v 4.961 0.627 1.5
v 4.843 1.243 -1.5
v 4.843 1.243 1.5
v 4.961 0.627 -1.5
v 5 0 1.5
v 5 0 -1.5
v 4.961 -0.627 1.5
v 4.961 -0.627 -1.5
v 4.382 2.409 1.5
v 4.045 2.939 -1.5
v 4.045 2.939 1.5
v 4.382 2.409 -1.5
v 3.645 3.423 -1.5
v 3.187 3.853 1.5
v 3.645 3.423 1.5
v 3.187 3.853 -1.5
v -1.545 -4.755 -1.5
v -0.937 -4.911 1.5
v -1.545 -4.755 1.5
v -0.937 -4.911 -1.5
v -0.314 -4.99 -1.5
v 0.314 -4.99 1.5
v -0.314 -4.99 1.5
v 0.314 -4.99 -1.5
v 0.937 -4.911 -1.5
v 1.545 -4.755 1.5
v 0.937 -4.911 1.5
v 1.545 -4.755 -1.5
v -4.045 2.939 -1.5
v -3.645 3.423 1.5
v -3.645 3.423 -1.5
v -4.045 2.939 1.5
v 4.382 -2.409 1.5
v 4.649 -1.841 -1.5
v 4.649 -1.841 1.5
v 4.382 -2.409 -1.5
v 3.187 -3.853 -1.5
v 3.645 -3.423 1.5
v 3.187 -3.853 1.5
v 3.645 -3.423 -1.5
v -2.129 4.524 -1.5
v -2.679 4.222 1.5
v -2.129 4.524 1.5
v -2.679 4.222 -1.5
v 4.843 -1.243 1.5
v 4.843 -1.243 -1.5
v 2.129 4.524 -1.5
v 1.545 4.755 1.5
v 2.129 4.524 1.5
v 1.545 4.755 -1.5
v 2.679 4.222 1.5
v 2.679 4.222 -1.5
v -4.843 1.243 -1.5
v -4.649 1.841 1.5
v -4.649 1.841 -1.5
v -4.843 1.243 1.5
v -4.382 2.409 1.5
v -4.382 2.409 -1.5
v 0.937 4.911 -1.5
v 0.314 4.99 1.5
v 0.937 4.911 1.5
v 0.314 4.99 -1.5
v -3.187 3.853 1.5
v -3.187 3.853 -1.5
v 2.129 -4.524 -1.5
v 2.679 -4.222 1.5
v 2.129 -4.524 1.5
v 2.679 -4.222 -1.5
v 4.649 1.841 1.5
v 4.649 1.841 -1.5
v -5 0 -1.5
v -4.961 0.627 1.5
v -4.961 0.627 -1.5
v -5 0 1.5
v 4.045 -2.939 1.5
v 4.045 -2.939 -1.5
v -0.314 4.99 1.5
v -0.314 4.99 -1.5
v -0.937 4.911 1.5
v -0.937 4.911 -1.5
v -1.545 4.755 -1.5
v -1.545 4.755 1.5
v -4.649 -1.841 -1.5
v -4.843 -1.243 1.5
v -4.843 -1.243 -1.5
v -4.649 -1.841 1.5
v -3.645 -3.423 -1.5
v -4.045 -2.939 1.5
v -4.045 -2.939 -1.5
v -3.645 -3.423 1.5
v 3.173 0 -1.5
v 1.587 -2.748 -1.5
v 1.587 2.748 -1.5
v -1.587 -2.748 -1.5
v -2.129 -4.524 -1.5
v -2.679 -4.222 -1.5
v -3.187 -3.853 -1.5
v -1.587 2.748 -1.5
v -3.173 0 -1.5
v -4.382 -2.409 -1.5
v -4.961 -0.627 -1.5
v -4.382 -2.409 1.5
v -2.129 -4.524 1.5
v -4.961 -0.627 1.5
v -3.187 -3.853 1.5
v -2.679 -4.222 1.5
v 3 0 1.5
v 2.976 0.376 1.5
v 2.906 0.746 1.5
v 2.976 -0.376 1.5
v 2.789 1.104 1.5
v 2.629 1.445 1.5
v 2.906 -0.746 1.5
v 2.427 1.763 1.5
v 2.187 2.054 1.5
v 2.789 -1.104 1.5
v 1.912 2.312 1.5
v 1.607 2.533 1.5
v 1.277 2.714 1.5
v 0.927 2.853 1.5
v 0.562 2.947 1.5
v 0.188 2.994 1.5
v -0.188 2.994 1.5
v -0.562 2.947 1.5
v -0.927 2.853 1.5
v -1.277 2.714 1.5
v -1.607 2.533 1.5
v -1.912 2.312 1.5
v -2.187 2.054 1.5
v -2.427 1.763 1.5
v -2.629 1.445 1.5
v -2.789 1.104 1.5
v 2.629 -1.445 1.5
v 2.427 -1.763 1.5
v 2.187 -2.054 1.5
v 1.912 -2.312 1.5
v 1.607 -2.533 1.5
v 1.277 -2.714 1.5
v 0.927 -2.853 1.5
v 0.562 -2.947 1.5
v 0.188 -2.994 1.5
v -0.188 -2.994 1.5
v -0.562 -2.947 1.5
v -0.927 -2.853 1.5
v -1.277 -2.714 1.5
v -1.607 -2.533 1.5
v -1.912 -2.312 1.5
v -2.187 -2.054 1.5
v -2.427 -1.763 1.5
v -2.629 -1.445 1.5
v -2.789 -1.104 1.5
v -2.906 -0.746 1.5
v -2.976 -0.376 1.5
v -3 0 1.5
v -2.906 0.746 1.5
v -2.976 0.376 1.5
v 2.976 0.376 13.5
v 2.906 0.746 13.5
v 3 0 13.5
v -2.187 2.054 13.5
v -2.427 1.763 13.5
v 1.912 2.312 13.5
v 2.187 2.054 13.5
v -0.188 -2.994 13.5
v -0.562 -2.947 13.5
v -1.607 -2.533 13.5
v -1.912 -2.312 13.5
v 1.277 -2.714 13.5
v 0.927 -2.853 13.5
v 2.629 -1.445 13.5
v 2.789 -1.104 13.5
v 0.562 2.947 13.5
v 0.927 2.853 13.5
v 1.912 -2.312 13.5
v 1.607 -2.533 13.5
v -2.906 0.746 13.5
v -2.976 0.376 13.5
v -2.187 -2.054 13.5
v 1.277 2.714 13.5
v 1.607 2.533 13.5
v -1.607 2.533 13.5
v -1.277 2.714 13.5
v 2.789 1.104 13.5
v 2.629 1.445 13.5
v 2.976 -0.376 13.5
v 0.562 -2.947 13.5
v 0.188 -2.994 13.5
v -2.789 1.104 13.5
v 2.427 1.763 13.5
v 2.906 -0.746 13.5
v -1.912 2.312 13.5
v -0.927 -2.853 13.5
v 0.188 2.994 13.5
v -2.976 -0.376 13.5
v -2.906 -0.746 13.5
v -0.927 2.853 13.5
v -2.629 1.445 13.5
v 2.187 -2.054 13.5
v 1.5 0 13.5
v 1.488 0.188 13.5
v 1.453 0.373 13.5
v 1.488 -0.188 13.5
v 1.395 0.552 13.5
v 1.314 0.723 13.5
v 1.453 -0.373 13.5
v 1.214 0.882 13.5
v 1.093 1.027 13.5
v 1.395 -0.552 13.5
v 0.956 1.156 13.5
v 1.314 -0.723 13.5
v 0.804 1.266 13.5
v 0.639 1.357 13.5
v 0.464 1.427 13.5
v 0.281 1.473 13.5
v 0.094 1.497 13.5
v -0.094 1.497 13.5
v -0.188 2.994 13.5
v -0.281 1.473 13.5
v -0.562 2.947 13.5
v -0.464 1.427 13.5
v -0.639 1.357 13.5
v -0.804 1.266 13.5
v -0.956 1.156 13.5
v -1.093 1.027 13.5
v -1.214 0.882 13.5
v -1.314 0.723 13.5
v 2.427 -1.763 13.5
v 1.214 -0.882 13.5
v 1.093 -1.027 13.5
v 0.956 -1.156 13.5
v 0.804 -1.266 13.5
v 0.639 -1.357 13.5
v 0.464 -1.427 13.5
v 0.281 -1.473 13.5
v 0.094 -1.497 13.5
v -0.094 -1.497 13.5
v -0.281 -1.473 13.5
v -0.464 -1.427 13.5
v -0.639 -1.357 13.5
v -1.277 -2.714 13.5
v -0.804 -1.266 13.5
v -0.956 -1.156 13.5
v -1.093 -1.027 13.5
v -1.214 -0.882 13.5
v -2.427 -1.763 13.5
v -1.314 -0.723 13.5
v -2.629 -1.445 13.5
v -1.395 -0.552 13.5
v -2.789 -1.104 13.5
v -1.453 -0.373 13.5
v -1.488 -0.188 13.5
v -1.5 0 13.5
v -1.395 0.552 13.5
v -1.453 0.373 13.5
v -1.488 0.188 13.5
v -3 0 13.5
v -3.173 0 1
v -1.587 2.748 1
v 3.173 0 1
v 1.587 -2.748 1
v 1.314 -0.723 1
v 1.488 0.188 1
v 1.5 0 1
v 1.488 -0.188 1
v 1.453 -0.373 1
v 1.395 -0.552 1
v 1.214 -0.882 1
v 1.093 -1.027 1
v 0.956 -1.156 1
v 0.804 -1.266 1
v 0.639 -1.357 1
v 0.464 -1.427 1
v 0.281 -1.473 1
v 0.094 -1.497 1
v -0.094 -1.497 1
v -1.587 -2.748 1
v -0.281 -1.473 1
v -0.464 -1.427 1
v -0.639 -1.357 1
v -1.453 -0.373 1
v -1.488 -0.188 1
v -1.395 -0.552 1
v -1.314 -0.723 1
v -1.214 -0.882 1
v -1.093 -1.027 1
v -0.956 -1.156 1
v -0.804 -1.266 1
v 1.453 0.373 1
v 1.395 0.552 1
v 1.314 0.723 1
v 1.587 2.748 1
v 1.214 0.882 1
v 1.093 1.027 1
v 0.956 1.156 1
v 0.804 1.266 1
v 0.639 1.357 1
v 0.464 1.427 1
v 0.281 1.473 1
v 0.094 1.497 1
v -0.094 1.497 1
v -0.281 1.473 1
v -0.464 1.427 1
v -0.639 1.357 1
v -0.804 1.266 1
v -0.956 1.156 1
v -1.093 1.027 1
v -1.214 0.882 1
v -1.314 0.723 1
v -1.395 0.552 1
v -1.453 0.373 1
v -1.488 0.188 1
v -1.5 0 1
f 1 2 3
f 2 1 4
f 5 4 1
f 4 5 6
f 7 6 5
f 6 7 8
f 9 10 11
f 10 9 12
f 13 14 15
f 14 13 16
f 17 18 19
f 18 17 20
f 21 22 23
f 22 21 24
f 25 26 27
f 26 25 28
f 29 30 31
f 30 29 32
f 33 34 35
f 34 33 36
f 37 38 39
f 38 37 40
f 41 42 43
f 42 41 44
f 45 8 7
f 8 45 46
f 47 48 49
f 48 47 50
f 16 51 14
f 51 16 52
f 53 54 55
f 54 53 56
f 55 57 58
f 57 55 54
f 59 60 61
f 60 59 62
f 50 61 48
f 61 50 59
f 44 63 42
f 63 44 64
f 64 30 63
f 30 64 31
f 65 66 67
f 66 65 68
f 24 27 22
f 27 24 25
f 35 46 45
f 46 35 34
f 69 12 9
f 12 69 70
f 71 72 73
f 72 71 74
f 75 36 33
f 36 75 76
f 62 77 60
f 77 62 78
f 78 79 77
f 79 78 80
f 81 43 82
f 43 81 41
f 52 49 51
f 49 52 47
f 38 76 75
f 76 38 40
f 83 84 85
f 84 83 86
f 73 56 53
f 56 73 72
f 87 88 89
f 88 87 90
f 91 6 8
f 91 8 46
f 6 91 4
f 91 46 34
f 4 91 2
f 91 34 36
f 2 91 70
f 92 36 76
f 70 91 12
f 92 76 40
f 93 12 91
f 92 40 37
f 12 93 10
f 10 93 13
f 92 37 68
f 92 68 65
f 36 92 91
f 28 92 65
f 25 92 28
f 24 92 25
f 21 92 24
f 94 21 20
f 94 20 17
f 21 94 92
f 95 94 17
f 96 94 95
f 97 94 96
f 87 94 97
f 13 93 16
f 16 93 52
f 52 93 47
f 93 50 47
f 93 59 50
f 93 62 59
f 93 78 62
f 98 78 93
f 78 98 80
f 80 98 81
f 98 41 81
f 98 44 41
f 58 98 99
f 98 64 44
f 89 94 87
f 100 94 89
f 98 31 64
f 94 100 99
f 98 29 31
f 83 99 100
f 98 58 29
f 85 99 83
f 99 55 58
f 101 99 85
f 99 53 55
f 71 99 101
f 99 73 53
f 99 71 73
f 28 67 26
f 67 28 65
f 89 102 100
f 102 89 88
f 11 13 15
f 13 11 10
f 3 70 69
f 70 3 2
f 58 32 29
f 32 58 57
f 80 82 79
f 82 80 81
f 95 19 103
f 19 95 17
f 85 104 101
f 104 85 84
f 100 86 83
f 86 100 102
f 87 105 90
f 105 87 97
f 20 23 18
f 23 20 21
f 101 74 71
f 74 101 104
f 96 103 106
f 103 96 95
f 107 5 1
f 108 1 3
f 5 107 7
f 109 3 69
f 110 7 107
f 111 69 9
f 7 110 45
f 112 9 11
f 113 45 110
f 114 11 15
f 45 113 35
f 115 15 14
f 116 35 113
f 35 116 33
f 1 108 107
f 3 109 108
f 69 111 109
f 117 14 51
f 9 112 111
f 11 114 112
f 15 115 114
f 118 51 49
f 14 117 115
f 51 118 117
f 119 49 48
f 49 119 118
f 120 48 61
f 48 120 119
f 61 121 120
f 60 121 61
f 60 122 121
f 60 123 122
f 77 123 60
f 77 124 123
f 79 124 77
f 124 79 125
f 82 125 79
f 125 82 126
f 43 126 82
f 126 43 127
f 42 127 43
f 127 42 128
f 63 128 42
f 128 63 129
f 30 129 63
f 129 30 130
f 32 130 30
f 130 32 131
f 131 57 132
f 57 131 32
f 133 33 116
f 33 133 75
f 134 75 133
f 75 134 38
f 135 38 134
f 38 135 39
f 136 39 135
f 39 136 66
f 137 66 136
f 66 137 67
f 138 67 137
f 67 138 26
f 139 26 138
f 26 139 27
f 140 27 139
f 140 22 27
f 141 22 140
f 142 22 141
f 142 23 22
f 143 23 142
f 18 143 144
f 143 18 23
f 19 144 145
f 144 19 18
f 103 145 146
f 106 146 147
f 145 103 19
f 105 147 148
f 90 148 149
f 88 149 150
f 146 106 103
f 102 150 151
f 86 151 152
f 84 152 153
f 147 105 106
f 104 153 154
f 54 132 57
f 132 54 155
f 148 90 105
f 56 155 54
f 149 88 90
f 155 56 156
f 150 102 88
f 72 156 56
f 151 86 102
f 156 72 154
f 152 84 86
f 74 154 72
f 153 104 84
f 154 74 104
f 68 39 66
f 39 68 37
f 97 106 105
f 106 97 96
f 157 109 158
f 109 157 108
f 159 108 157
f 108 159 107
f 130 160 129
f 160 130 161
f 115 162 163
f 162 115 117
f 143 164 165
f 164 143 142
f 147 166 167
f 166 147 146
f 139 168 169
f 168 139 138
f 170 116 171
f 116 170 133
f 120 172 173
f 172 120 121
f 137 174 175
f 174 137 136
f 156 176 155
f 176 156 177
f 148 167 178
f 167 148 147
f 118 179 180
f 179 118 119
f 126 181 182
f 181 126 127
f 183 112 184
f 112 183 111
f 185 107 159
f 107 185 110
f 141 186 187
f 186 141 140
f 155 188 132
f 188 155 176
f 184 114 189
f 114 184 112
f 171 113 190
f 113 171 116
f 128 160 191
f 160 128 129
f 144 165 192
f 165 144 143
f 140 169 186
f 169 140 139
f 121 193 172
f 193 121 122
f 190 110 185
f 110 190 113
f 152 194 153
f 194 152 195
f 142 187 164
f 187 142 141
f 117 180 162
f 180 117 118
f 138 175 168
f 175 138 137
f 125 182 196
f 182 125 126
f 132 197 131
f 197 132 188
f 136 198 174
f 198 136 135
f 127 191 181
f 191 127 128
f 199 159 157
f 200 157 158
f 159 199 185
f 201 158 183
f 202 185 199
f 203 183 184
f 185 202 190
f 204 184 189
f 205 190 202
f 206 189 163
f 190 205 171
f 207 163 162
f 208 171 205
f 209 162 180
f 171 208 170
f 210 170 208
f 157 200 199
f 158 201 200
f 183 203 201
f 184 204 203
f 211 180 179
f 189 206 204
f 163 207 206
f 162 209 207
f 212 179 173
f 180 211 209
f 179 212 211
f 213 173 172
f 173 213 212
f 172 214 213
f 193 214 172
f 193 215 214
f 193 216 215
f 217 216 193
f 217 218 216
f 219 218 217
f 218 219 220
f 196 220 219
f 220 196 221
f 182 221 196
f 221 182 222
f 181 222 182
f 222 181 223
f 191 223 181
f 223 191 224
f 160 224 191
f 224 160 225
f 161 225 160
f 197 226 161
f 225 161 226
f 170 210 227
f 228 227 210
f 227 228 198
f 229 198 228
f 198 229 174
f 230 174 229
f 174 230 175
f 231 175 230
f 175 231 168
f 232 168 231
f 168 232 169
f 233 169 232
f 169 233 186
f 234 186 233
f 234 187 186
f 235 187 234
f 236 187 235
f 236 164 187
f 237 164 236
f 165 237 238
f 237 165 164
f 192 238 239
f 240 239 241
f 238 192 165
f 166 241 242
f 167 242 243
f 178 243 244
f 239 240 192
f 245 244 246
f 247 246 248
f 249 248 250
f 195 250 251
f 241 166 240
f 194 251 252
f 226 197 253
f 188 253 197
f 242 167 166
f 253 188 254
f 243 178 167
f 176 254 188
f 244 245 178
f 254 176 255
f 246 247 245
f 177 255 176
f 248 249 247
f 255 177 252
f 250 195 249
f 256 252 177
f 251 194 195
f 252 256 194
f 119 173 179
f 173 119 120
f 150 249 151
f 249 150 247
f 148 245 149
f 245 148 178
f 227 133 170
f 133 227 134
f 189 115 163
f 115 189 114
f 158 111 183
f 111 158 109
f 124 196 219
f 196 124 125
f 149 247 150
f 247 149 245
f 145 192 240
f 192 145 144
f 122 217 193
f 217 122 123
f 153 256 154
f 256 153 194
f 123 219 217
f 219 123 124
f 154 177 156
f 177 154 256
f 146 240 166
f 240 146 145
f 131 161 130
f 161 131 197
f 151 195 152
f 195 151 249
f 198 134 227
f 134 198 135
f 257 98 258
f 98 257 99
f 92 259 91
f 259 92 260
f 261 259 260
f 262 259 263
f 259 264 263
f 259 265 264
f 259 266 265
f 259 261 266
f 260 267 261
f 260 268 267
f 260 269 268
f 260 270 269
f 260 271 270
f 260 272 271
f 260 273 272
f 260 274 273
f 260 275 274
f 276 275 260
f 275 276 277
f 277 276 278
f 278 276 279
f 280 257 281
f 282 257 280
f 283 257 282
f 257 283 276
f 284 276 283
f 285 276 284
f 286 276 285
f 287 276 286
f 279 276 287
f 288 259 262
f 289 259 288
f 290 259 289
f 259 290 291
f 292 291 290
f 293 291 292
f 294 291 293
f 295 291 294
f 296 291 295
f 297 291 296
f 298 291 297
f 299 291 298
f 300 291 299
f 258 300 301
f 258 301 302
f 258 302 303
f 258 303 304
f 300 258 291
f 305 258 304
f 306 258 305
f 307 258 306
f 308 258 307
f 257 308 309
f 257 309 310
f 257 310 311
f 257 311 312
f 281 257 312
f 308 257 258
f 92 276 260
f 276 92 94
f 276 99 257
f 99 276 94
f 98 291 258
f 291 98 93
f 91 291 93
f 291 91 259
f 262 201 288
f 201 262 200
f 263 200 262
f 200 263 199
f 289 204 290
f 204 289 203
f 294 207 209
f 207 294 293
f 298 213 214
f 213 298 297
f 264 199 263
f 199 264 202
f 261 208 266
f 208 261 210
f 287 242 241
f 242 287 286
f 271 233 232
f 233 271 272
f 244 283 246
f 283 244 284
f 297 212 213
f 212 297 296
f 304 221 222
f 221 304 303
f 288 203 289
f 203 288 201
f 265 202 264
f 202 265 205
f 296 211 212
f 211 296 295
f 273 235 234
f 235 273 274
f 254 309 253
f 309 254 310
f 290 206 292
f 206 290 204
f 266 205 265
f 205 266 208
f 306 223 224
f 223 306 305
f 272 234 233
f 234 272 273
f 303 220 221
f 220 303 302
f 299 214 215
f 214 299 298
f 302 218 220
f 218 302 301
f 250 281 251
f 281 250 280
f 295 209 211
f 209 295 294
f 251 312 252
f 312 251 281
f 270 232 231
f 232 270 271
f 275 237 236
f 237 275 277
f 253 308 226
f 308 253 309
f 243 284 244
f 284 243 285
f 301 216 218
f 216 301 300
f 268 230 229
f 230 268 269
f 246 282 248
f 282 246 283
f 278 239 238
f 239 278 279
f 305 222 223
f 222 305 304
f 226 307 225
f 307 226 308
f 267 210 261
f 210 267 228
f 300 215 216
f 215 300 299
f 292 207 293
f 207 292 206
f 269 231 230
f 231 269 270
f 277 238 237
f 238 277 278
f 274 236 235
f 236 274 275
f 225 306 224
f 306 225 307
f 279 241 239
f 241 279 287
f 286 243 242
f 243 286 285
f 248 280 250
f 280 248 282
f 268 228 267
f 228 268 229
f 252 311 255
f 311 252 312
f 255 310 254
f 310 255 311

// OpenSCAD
$fn = 50;


difference() {
	union() {
		translate(v = [0, 0, -1.5000000000]) {
			cylinder(h = 3, r = 5.0000000000);
		}
		translate(v = [0, 0, -1.5000000000]) {
			cylinder(h = 15, r = 3.0000000000);
		}
	}
	union() {
		translate(v = [0, 0, -1.5000000000]) {
			rotate(a = [0, 0, 0]) {
				difference() {
					union() {
						#linear_extrude(height = 2.5000000000) {
							polygon(points = [[3.1735000000, 0.0000000000], [1.5867500000, 2.7483316189], [-1.5867500000, 2.7483316189], [-3.1735000000, 0.0000000000], [-1.5867500000, -2.7483316189], [1.5867500000, -2.7483316189]]);
						}
					}
					union();
				}
			}
		}
		translate(v = [0, 0, -50.0000000000]) {
			cylinder(h = 100, r = 1.5000000000);
		}
	}
}
